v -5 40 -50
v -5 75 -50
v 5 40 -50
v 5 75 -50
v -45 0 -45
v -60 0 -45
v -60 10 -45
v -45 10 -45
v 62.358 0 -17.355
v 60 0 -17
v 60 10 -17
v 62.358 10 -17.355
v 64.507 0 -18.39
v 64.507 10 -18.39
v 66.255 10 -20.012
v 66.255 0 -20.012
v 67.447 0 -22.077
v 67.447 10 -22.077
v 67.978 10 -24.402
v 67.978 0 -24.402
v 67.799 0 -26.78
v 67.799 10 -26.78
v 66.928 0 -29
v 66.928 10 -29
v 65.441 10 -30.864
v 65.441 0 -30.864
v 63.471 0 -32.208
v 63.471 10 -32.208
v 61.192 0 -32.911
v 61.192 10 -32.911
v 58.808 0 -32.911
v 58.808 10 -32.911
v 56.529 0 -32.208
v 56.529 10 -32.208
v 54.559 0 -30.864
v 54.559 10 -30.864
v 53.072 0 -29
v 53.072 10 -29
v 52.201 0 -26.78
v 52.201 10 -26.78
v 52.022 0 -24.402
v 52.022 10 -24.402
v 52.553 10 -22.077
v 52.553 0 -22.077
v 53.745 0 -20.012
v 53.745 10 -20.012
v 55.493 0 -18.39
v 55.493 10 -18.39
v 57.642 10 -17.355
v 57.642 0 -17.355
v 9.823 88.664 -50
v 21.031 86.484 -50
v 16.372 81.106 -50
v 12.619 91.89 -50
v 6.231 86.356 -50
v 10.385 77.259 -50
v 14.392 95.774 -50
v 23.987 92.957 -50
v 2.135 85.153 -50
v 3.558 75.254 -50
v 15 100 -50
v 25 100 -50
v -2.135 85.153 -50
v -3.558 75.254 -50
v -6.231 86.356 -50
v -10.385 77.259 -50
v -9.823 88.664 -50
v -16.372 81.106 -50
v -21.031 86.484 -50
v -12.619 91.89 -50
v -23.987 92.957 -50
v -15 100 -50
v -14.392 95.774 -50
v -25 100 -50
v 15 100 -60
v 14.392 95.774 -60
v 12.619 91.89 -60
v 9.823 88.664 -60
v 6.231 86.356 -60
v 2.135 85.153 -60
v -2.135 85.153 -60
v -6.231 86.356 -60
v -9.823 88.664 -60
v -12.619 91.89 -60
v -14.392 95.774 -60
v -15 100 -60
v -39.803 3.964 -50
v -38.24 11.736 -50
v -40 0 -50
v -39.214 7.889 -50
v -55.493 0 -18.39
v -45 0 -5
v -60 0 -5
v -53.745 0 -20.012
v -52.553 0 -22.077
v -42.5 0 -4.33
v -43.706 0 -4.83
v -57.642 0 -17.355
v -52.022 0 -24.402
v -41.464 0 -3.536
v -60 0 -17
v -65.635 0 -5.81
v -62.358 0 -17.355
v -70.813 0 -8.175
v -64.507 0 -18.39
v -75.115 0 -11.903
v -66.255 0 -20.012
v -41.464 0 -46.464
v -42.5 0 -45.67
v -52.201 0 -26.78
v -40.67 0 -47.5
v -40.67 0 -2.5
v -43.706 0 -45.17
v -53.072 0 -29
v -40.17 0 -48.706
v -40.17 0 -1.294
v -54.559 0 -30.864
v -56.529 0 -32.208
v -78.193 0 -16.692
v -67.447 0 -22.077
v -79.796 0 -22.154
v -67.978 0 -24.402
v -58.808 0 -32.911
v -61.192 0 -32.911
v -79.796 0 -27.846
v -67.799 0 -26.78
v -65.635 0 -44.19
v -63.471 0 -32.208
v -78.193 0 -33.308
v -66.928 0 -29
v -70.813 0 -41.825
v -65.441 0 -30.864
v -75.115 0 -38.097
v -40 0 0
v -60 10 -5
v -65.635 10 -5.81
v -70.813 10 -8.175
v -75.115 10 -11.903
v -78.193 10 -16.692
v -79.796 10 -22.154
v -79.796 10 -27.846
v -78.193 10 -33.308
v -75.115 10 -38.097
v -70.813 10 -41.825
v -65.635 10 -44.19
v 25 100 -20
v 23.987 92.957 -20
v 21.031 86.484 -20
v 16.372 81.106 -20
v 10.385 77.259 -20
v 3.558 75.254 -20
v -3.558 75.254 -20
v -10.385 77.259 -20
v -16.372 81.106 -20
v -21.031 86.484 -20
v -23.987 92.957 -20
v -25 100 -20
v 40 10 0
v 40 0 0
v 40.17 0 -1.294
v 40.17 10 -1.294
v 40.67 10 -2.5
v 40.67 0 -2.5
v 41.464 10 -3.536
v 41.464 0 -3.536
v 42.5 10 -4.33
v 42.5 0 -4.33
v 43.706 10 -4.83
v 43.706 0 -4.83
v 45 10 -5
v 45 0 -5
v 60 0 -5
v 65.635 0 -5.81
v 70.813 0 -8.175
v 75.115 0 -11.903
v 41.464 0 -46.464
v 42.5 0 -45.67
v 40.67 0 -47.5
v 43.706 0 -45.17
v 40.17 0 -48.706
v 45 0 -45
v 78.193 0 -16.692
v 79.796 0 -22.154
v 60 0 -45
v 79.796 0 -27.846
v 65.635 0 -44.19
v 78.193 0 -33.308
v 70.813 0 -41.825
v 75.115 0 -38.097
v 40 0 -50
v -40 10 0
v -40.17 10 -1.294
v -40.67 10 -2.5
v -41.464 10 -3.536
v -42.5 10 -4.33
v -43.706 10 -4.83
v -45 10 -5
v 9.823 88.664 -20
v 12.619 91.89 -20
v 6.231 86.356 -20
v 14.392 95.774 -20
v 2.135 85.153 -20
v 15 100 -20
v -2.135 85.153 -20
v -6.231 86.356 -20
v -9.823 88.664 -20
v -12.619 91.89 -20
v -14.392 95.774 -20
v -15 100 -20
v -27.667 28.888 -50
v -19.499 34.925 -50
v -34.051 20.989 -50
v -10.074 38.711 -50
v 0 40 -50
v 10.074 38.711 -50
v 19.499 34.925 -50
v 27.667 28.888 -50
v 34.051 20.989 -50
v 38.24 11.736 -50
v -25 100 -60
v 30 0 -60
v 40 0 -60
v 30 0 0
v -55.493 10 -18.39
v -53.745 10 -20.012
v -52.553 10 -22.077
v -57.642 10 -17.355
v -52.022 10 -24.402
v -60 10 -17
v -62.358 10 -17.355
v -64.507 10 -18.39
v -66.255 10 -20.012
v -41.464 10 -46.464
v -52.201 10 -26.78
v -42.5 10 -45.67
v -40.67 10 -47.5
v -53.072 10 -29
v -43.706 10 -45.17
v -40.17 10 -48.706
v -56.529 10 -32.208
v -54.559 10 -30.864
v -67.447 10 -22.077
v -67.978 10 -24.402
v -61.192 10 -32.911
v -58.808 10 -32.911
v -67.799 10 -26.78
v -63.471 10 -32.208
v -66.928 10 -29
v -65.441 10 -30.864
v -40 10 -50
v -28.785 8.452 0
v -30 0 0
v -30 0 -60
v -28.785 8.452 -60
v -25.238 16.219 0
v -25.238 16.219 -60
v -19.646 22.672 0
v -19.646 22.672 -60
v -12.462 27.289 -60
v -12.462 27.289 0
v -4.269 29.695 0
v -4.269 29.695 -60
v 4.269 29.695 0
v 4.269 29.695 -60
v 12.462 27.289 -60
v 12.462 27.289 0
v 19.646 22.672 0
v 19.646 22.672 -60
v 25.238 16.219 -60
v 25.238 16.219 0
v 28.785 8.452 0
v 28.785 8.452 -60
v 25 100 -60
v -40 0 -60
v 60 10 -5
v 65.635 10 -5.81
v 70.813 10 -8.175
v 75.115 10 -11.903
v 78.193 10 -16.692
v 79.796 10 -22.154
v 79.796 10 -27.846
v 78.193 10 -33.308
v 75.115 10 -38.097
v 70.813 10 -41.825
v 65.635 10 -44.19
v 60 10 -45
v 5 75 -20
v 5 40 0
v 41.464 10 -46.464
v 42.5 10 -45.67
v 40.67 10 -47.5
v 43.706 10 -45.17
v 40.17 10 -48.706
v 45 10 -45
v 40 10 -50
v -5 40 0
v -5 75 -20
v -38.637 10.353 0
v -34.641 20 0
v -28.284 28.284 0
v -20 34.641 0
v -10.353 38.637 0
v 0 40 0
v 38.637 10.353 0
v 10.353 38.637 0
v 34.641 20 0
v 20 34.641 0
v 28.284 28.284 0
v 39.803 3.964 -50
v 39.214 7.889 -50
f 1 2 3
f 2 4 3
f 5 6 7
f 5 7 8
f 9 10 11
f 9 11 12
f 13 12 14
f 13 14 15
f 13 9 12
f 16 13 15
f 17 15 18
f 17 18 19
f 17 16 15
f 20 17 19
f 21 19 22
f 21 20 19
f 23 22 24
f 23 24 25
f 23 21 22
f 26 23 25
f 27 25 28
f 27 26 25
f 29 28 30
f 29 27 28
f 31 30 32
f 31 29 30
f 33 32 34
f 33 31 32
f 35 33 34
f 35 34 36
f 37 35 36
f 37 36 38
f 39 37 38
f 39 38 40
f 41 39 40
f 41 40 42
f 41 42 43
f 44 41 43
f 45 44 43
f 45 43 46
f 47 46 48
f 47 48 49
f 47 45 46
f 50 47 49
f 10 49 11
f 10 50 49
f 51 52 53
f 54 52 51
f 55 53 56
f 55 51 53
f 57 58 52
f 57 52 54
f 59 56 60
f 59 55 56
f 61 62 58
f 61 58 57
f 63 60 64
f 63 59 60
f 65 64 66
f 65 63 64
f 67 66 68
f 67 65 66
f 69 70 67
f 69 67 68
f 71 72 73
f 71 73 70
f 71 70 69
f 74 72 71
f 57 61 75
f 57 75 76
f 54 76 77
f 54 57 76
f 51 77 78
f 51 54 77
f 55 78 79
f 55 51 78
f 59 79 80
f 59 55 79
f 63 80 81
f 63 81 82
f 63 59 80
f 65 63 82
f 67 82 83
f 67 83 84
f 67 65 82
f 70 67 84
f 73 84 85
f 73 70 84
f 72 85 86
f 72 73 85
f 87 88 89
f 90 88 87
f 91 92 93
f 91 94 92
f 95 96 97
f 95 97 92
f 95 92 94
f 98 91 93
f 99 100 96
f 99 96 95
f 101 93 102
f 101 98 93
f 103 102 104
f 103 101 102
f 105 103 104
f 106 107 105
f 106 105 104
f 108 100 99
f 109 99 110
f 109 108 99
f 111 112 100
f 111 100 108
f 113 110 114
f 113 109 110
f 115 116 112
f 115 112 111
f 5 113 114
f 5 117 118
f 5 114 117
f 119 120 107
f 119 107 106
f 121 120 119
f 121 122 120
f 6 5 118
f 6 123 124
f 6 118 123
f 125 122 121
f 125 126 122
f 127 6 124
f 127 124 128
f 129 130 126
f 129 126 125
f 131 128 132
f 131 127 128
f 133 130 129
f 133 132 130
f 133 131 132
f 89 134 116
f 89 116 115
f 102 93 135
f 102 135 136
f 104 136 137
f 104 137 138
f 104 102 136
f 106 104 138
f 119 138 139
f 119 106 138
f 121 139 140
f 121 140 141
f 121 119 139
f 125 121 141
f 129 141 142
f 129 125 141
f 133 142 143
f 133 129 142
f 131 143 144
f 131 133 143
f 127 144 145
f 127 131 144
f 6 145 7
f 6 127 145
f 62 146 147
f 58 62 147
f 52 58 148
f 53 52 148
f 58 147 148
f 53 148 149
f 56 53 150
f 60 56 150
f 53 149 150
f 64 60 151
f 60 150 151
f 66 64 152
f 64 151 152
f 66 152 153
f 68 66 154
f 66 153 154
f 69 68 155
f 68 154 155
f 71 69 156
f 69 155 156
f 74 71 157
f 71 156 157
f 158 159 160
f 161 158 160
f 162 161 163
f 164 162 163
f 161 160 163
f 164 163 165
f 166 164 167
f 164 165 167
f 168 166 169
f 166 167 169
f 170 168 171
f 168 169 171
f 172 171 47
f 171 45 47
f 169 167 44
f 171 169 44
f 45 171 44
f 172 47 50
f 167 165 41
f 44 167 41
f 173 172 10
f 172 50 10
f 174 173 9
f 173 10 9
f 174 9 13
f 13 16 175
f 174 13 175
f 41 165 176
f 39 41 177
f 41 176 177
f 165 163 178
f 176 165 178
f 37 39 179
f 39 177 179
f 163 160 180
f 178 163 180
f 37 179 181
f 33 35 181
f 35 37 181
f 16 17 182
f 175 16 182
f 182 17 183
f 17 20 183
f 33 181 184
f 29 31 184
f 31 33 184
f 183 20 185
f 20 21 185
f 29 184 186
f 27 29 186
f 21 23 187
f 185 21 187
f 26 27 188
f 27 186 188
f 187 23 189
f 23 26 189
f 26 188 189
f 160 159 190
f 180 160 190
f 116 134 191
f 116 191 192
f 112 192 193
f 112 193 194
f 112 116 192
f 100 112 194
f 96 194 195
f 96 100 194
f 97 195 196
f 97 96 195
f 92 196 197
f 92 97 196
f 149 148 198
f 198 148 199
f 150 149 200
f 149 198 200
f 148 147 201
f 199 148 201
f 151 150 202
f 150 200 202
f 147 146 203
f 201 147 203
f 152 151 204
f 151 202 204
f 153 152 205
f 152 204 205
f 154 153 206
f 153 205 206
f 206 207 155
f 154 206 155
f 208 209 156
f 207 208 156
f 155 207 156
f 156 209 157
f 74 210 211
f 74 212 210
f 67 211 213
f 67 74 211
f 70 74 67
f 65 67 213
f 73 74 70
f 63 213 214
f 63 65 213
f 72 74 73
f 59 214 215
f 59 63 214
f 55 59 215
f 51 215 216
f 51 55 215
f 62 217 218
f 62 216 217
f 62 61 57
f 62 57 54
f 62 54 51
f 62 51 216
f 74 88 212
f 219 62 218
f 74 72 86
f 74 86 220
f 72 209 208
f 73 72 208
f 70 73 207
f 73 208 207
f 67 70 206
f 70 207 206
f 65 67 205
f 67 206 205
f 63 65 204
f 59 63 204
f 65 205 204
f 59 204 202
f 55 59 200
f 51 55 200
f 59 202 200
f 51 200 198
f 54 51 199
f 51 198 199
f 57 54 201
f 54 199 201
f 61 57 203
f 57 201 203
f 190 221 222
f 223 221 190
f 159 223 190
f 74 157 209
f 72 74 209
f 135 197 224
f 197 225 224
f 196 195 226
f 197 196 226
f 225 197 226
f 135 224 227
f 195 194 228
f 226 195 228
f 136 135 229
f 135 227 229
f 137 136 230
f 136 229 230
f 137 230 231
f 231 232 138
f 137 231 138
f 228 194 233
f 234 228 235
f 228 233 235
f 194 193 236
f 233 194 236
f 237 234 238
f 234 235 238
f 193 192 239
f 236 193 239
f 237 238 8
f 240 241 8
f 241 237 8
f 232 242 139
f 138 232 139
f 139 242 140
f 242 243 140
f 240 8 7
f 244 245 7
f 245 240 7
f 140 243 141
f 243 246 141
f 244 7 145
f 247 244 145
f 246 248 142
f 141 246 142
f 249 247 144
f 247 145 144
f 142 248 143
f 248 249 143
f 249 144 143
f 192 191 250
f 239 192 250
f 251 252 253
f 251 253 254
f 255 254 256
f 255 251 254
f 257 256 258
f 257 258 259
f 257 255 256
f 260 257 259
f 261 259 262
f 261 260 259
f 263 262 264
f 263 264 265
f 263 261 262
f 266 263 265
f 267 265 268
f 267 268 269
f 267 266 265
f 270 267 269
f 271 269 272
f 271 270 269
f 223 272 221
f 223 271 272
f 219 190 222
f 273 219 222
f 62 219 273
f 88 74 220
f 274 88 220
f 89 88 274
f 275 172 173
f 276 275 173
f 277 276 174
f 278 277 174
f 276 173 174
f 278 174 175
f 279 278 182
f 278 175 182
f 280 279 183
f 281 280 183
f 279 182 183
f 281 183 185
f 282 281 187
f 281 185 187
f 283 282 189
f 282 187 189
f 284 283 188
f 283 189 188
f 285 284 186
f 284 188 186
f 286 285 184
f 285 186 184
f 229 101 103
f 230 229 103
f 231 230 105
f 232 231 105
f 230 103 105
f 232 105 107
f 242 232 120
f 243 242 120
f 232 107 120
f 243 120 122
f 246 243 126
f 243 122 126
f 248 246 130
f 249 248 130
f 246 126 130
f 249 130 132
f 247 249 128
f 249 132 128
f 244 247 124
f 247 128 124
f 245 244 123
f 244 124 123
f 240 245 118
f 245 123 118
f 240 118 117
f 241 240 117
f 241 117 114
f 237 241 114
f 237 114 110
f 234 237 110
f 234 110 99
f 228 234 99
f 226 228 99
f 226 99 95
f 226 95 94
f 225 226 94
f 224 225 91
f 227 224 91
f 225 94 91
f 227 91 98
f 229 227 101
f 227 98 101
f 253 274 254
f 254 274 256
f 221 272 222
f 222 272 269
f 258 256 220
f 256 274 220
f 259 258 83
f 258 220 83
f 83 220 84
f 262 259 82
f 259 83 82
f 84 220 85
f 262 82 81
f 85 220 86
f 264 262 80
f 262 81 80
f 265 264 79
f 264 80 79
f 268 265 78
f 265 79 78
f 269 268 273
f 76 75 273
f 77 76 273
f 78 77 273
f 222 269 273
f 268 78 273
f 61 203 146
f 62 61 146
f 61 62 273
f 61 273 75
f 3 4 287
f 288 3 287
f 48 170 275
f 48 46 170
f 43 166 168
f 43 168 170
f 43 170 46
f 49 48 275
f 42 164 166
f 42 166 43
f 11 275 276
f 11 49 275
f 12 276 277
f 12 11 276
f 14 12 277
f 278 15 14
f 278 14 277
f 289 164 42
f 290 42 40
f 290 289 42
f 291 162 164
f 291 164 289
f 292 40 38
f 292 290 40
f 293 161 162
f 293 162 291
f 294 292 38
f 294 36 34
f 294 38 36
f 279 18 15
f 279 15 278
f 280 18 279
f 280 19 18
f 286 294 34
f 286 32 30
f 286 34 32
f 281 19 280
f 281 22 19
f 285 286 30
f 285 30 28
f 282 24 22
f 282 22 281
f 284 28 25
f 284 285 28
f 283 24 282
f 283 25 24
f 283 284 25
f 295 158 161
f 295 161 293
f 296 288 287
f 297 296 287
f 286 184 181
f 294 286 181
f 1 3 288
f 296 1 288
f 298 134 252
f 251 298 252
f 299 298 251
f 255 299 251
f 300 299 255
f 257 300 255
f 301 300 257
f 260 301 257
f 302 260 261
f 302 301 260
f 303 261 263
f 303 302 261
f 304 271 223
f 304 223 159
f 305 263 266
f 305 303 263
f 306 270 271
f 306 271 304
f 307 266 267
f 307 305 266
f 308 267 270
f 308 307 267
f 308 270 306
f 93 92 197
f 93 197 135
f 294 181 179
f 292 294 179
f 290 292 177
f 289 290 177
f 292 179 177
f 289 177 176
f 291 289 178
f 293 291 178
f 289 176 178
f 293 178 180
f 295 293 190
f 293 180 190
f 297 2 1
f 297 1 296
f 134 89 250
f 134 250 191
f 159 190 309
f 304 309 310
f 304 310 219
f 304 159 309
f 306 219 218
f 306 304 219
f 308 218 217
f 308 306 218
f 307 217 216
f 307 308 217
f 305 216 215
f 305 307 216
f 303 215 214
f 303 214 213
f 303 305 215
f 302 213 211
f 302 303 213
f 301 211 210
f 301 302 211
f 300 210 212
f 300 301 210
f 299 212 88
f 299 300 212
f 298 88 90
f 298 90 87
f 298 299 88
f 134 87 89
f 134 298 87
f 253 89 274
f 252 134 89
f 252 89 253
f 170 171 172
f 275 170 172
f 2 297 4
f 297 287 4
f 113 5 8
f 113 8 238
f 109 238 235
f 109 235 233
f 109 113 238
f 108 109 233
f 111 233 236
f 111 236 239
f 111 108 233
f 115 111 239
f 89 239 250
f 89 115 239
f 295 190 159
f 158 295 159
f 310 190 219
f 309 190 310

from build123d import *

# Parameters (mm, degrees)
BOSS_EXTRUDE1_DEPTH = 50
BOSS_EXTRUDE2_DEPTH = 5
BOSS_EXTRUDE3_DEPTH = 30
BOSS_EXTRUDE5_DEPTH = 10
SKETCH6_R           = 8
BOSS_EXTRUDE9_DEPTH = 10


with BuildPart() as part:
    # Sketch1 → Boss-Extrude1 (new body)
    with BuildSketch(Plane.XY):
        with BuildLine():
            Line((-40, 0), (-30, 0))
            ThreePointArc((-30, 0), (0, 30), (30, 0))
            Line((30, 0), (40, 0))
            ThreePointArc((40, 0), (0, 40), (-40, 0))
        make_face()
    extrude(amount=-BOSS_EXTRUDE1_DEPTH)



with BuildPart() as body_2:
    # Sketch2 → Boss-Extrude2 (new body, symmetric)
    with BuildSketch(Plane(origin=(0, 0, 0), x_dir=(0, 0, -1), z_dir=(1, 0, 0))):
        Polygon((0, 40), (20, 75), (50, 75), (50, 40), align=None)
    extrude(amount=BOSS_EXTRUDE2_DEPTH, both=True)


with BuildPart() as body_3:
    # Sketch4 → Boss-Extrude3 (new body)
    with BuildSketch(Plane(origin=(0, 0, -20), x_dir=(-1, 0, 0), z_dir=(0, 0, -1))):
        with BuildLine():
            Line((-15, 100), (-25, 100))
            ThreePointArc((-25, 100), (0, 75), (25, 100))
            Line((25, 100), (15, 100))
            ThreePointArc((15, 100), (0, 85), (-15, 100))
        make_face()
    extrude(amount=BOSS_EXTRUDE3_DEPTH)


with BuildPart() as body_4:
    # Sketch5 → Boss-Extrude5 (new body)
    with BuildSketch(Plane.XY.offset(-50)):
        with BuildLine():
            Line((-25, 100), (-40, 0))
            Line((-40, 0), (-30, 0))
            ThreePointArc((-30, 0), (0, 30), (30, 0))
            Line((30, 0), (40, 0))
            Line((40, 0), (25, 100))
            Line((25, 100), (15, 100))
            ThreePointArc((15, 100), (0, 85), (-15, 100))
            Line((-15, 100), (-25, 100))
        make_face()
    extrude(amount=-BOSS_EXTRUDE5_DEPTH)


with BuildPart() as part_1:
    add(part.part)

    add(body_4.part)  # Boss-Extrude9 merges body 4
    # Sketch6 → Boss-Extrude9 (add)
    with BuildSketch(Plane(origin=(0, 0, 0), x_dir=(1, 0, 0), z_dir=(0, 1, 0))):
        with BuildLine():
            Line((60, 45), (45, 45))
            ThreePointArc((45, 45), (41.464466094, 46.464466094), (40, 50))
            Line((40, 50), (40, 0))
            ThreePointArc((40, 0), (41.464466094, 3.535533906), (45, 5))
            Line((45, 5), (60, 5))
            ThreePointArc((60, 5), (80, 25), (60, 45))
        make_face()
        with Locations(Location((60, 25, 0), (0, 0, 270))):  # turned: the seam where the file's is
            Circle(SKETCH6_R, mode=Mode.SUBTRACT)
    extrude(amount=BOSS_EXTRUDE9_DEPTH)

    # Mirror3: part across plane


with BuildPart() as part_2:
    add(part_1.part)
    add(part_1.part.mirror(Plane(origin=(0, 0, 0), x_dir=(0, 0, 1), z_dir=(1, 0, 0))))


solid = Compound([body_2.part, body_3.part, part_2.part])
